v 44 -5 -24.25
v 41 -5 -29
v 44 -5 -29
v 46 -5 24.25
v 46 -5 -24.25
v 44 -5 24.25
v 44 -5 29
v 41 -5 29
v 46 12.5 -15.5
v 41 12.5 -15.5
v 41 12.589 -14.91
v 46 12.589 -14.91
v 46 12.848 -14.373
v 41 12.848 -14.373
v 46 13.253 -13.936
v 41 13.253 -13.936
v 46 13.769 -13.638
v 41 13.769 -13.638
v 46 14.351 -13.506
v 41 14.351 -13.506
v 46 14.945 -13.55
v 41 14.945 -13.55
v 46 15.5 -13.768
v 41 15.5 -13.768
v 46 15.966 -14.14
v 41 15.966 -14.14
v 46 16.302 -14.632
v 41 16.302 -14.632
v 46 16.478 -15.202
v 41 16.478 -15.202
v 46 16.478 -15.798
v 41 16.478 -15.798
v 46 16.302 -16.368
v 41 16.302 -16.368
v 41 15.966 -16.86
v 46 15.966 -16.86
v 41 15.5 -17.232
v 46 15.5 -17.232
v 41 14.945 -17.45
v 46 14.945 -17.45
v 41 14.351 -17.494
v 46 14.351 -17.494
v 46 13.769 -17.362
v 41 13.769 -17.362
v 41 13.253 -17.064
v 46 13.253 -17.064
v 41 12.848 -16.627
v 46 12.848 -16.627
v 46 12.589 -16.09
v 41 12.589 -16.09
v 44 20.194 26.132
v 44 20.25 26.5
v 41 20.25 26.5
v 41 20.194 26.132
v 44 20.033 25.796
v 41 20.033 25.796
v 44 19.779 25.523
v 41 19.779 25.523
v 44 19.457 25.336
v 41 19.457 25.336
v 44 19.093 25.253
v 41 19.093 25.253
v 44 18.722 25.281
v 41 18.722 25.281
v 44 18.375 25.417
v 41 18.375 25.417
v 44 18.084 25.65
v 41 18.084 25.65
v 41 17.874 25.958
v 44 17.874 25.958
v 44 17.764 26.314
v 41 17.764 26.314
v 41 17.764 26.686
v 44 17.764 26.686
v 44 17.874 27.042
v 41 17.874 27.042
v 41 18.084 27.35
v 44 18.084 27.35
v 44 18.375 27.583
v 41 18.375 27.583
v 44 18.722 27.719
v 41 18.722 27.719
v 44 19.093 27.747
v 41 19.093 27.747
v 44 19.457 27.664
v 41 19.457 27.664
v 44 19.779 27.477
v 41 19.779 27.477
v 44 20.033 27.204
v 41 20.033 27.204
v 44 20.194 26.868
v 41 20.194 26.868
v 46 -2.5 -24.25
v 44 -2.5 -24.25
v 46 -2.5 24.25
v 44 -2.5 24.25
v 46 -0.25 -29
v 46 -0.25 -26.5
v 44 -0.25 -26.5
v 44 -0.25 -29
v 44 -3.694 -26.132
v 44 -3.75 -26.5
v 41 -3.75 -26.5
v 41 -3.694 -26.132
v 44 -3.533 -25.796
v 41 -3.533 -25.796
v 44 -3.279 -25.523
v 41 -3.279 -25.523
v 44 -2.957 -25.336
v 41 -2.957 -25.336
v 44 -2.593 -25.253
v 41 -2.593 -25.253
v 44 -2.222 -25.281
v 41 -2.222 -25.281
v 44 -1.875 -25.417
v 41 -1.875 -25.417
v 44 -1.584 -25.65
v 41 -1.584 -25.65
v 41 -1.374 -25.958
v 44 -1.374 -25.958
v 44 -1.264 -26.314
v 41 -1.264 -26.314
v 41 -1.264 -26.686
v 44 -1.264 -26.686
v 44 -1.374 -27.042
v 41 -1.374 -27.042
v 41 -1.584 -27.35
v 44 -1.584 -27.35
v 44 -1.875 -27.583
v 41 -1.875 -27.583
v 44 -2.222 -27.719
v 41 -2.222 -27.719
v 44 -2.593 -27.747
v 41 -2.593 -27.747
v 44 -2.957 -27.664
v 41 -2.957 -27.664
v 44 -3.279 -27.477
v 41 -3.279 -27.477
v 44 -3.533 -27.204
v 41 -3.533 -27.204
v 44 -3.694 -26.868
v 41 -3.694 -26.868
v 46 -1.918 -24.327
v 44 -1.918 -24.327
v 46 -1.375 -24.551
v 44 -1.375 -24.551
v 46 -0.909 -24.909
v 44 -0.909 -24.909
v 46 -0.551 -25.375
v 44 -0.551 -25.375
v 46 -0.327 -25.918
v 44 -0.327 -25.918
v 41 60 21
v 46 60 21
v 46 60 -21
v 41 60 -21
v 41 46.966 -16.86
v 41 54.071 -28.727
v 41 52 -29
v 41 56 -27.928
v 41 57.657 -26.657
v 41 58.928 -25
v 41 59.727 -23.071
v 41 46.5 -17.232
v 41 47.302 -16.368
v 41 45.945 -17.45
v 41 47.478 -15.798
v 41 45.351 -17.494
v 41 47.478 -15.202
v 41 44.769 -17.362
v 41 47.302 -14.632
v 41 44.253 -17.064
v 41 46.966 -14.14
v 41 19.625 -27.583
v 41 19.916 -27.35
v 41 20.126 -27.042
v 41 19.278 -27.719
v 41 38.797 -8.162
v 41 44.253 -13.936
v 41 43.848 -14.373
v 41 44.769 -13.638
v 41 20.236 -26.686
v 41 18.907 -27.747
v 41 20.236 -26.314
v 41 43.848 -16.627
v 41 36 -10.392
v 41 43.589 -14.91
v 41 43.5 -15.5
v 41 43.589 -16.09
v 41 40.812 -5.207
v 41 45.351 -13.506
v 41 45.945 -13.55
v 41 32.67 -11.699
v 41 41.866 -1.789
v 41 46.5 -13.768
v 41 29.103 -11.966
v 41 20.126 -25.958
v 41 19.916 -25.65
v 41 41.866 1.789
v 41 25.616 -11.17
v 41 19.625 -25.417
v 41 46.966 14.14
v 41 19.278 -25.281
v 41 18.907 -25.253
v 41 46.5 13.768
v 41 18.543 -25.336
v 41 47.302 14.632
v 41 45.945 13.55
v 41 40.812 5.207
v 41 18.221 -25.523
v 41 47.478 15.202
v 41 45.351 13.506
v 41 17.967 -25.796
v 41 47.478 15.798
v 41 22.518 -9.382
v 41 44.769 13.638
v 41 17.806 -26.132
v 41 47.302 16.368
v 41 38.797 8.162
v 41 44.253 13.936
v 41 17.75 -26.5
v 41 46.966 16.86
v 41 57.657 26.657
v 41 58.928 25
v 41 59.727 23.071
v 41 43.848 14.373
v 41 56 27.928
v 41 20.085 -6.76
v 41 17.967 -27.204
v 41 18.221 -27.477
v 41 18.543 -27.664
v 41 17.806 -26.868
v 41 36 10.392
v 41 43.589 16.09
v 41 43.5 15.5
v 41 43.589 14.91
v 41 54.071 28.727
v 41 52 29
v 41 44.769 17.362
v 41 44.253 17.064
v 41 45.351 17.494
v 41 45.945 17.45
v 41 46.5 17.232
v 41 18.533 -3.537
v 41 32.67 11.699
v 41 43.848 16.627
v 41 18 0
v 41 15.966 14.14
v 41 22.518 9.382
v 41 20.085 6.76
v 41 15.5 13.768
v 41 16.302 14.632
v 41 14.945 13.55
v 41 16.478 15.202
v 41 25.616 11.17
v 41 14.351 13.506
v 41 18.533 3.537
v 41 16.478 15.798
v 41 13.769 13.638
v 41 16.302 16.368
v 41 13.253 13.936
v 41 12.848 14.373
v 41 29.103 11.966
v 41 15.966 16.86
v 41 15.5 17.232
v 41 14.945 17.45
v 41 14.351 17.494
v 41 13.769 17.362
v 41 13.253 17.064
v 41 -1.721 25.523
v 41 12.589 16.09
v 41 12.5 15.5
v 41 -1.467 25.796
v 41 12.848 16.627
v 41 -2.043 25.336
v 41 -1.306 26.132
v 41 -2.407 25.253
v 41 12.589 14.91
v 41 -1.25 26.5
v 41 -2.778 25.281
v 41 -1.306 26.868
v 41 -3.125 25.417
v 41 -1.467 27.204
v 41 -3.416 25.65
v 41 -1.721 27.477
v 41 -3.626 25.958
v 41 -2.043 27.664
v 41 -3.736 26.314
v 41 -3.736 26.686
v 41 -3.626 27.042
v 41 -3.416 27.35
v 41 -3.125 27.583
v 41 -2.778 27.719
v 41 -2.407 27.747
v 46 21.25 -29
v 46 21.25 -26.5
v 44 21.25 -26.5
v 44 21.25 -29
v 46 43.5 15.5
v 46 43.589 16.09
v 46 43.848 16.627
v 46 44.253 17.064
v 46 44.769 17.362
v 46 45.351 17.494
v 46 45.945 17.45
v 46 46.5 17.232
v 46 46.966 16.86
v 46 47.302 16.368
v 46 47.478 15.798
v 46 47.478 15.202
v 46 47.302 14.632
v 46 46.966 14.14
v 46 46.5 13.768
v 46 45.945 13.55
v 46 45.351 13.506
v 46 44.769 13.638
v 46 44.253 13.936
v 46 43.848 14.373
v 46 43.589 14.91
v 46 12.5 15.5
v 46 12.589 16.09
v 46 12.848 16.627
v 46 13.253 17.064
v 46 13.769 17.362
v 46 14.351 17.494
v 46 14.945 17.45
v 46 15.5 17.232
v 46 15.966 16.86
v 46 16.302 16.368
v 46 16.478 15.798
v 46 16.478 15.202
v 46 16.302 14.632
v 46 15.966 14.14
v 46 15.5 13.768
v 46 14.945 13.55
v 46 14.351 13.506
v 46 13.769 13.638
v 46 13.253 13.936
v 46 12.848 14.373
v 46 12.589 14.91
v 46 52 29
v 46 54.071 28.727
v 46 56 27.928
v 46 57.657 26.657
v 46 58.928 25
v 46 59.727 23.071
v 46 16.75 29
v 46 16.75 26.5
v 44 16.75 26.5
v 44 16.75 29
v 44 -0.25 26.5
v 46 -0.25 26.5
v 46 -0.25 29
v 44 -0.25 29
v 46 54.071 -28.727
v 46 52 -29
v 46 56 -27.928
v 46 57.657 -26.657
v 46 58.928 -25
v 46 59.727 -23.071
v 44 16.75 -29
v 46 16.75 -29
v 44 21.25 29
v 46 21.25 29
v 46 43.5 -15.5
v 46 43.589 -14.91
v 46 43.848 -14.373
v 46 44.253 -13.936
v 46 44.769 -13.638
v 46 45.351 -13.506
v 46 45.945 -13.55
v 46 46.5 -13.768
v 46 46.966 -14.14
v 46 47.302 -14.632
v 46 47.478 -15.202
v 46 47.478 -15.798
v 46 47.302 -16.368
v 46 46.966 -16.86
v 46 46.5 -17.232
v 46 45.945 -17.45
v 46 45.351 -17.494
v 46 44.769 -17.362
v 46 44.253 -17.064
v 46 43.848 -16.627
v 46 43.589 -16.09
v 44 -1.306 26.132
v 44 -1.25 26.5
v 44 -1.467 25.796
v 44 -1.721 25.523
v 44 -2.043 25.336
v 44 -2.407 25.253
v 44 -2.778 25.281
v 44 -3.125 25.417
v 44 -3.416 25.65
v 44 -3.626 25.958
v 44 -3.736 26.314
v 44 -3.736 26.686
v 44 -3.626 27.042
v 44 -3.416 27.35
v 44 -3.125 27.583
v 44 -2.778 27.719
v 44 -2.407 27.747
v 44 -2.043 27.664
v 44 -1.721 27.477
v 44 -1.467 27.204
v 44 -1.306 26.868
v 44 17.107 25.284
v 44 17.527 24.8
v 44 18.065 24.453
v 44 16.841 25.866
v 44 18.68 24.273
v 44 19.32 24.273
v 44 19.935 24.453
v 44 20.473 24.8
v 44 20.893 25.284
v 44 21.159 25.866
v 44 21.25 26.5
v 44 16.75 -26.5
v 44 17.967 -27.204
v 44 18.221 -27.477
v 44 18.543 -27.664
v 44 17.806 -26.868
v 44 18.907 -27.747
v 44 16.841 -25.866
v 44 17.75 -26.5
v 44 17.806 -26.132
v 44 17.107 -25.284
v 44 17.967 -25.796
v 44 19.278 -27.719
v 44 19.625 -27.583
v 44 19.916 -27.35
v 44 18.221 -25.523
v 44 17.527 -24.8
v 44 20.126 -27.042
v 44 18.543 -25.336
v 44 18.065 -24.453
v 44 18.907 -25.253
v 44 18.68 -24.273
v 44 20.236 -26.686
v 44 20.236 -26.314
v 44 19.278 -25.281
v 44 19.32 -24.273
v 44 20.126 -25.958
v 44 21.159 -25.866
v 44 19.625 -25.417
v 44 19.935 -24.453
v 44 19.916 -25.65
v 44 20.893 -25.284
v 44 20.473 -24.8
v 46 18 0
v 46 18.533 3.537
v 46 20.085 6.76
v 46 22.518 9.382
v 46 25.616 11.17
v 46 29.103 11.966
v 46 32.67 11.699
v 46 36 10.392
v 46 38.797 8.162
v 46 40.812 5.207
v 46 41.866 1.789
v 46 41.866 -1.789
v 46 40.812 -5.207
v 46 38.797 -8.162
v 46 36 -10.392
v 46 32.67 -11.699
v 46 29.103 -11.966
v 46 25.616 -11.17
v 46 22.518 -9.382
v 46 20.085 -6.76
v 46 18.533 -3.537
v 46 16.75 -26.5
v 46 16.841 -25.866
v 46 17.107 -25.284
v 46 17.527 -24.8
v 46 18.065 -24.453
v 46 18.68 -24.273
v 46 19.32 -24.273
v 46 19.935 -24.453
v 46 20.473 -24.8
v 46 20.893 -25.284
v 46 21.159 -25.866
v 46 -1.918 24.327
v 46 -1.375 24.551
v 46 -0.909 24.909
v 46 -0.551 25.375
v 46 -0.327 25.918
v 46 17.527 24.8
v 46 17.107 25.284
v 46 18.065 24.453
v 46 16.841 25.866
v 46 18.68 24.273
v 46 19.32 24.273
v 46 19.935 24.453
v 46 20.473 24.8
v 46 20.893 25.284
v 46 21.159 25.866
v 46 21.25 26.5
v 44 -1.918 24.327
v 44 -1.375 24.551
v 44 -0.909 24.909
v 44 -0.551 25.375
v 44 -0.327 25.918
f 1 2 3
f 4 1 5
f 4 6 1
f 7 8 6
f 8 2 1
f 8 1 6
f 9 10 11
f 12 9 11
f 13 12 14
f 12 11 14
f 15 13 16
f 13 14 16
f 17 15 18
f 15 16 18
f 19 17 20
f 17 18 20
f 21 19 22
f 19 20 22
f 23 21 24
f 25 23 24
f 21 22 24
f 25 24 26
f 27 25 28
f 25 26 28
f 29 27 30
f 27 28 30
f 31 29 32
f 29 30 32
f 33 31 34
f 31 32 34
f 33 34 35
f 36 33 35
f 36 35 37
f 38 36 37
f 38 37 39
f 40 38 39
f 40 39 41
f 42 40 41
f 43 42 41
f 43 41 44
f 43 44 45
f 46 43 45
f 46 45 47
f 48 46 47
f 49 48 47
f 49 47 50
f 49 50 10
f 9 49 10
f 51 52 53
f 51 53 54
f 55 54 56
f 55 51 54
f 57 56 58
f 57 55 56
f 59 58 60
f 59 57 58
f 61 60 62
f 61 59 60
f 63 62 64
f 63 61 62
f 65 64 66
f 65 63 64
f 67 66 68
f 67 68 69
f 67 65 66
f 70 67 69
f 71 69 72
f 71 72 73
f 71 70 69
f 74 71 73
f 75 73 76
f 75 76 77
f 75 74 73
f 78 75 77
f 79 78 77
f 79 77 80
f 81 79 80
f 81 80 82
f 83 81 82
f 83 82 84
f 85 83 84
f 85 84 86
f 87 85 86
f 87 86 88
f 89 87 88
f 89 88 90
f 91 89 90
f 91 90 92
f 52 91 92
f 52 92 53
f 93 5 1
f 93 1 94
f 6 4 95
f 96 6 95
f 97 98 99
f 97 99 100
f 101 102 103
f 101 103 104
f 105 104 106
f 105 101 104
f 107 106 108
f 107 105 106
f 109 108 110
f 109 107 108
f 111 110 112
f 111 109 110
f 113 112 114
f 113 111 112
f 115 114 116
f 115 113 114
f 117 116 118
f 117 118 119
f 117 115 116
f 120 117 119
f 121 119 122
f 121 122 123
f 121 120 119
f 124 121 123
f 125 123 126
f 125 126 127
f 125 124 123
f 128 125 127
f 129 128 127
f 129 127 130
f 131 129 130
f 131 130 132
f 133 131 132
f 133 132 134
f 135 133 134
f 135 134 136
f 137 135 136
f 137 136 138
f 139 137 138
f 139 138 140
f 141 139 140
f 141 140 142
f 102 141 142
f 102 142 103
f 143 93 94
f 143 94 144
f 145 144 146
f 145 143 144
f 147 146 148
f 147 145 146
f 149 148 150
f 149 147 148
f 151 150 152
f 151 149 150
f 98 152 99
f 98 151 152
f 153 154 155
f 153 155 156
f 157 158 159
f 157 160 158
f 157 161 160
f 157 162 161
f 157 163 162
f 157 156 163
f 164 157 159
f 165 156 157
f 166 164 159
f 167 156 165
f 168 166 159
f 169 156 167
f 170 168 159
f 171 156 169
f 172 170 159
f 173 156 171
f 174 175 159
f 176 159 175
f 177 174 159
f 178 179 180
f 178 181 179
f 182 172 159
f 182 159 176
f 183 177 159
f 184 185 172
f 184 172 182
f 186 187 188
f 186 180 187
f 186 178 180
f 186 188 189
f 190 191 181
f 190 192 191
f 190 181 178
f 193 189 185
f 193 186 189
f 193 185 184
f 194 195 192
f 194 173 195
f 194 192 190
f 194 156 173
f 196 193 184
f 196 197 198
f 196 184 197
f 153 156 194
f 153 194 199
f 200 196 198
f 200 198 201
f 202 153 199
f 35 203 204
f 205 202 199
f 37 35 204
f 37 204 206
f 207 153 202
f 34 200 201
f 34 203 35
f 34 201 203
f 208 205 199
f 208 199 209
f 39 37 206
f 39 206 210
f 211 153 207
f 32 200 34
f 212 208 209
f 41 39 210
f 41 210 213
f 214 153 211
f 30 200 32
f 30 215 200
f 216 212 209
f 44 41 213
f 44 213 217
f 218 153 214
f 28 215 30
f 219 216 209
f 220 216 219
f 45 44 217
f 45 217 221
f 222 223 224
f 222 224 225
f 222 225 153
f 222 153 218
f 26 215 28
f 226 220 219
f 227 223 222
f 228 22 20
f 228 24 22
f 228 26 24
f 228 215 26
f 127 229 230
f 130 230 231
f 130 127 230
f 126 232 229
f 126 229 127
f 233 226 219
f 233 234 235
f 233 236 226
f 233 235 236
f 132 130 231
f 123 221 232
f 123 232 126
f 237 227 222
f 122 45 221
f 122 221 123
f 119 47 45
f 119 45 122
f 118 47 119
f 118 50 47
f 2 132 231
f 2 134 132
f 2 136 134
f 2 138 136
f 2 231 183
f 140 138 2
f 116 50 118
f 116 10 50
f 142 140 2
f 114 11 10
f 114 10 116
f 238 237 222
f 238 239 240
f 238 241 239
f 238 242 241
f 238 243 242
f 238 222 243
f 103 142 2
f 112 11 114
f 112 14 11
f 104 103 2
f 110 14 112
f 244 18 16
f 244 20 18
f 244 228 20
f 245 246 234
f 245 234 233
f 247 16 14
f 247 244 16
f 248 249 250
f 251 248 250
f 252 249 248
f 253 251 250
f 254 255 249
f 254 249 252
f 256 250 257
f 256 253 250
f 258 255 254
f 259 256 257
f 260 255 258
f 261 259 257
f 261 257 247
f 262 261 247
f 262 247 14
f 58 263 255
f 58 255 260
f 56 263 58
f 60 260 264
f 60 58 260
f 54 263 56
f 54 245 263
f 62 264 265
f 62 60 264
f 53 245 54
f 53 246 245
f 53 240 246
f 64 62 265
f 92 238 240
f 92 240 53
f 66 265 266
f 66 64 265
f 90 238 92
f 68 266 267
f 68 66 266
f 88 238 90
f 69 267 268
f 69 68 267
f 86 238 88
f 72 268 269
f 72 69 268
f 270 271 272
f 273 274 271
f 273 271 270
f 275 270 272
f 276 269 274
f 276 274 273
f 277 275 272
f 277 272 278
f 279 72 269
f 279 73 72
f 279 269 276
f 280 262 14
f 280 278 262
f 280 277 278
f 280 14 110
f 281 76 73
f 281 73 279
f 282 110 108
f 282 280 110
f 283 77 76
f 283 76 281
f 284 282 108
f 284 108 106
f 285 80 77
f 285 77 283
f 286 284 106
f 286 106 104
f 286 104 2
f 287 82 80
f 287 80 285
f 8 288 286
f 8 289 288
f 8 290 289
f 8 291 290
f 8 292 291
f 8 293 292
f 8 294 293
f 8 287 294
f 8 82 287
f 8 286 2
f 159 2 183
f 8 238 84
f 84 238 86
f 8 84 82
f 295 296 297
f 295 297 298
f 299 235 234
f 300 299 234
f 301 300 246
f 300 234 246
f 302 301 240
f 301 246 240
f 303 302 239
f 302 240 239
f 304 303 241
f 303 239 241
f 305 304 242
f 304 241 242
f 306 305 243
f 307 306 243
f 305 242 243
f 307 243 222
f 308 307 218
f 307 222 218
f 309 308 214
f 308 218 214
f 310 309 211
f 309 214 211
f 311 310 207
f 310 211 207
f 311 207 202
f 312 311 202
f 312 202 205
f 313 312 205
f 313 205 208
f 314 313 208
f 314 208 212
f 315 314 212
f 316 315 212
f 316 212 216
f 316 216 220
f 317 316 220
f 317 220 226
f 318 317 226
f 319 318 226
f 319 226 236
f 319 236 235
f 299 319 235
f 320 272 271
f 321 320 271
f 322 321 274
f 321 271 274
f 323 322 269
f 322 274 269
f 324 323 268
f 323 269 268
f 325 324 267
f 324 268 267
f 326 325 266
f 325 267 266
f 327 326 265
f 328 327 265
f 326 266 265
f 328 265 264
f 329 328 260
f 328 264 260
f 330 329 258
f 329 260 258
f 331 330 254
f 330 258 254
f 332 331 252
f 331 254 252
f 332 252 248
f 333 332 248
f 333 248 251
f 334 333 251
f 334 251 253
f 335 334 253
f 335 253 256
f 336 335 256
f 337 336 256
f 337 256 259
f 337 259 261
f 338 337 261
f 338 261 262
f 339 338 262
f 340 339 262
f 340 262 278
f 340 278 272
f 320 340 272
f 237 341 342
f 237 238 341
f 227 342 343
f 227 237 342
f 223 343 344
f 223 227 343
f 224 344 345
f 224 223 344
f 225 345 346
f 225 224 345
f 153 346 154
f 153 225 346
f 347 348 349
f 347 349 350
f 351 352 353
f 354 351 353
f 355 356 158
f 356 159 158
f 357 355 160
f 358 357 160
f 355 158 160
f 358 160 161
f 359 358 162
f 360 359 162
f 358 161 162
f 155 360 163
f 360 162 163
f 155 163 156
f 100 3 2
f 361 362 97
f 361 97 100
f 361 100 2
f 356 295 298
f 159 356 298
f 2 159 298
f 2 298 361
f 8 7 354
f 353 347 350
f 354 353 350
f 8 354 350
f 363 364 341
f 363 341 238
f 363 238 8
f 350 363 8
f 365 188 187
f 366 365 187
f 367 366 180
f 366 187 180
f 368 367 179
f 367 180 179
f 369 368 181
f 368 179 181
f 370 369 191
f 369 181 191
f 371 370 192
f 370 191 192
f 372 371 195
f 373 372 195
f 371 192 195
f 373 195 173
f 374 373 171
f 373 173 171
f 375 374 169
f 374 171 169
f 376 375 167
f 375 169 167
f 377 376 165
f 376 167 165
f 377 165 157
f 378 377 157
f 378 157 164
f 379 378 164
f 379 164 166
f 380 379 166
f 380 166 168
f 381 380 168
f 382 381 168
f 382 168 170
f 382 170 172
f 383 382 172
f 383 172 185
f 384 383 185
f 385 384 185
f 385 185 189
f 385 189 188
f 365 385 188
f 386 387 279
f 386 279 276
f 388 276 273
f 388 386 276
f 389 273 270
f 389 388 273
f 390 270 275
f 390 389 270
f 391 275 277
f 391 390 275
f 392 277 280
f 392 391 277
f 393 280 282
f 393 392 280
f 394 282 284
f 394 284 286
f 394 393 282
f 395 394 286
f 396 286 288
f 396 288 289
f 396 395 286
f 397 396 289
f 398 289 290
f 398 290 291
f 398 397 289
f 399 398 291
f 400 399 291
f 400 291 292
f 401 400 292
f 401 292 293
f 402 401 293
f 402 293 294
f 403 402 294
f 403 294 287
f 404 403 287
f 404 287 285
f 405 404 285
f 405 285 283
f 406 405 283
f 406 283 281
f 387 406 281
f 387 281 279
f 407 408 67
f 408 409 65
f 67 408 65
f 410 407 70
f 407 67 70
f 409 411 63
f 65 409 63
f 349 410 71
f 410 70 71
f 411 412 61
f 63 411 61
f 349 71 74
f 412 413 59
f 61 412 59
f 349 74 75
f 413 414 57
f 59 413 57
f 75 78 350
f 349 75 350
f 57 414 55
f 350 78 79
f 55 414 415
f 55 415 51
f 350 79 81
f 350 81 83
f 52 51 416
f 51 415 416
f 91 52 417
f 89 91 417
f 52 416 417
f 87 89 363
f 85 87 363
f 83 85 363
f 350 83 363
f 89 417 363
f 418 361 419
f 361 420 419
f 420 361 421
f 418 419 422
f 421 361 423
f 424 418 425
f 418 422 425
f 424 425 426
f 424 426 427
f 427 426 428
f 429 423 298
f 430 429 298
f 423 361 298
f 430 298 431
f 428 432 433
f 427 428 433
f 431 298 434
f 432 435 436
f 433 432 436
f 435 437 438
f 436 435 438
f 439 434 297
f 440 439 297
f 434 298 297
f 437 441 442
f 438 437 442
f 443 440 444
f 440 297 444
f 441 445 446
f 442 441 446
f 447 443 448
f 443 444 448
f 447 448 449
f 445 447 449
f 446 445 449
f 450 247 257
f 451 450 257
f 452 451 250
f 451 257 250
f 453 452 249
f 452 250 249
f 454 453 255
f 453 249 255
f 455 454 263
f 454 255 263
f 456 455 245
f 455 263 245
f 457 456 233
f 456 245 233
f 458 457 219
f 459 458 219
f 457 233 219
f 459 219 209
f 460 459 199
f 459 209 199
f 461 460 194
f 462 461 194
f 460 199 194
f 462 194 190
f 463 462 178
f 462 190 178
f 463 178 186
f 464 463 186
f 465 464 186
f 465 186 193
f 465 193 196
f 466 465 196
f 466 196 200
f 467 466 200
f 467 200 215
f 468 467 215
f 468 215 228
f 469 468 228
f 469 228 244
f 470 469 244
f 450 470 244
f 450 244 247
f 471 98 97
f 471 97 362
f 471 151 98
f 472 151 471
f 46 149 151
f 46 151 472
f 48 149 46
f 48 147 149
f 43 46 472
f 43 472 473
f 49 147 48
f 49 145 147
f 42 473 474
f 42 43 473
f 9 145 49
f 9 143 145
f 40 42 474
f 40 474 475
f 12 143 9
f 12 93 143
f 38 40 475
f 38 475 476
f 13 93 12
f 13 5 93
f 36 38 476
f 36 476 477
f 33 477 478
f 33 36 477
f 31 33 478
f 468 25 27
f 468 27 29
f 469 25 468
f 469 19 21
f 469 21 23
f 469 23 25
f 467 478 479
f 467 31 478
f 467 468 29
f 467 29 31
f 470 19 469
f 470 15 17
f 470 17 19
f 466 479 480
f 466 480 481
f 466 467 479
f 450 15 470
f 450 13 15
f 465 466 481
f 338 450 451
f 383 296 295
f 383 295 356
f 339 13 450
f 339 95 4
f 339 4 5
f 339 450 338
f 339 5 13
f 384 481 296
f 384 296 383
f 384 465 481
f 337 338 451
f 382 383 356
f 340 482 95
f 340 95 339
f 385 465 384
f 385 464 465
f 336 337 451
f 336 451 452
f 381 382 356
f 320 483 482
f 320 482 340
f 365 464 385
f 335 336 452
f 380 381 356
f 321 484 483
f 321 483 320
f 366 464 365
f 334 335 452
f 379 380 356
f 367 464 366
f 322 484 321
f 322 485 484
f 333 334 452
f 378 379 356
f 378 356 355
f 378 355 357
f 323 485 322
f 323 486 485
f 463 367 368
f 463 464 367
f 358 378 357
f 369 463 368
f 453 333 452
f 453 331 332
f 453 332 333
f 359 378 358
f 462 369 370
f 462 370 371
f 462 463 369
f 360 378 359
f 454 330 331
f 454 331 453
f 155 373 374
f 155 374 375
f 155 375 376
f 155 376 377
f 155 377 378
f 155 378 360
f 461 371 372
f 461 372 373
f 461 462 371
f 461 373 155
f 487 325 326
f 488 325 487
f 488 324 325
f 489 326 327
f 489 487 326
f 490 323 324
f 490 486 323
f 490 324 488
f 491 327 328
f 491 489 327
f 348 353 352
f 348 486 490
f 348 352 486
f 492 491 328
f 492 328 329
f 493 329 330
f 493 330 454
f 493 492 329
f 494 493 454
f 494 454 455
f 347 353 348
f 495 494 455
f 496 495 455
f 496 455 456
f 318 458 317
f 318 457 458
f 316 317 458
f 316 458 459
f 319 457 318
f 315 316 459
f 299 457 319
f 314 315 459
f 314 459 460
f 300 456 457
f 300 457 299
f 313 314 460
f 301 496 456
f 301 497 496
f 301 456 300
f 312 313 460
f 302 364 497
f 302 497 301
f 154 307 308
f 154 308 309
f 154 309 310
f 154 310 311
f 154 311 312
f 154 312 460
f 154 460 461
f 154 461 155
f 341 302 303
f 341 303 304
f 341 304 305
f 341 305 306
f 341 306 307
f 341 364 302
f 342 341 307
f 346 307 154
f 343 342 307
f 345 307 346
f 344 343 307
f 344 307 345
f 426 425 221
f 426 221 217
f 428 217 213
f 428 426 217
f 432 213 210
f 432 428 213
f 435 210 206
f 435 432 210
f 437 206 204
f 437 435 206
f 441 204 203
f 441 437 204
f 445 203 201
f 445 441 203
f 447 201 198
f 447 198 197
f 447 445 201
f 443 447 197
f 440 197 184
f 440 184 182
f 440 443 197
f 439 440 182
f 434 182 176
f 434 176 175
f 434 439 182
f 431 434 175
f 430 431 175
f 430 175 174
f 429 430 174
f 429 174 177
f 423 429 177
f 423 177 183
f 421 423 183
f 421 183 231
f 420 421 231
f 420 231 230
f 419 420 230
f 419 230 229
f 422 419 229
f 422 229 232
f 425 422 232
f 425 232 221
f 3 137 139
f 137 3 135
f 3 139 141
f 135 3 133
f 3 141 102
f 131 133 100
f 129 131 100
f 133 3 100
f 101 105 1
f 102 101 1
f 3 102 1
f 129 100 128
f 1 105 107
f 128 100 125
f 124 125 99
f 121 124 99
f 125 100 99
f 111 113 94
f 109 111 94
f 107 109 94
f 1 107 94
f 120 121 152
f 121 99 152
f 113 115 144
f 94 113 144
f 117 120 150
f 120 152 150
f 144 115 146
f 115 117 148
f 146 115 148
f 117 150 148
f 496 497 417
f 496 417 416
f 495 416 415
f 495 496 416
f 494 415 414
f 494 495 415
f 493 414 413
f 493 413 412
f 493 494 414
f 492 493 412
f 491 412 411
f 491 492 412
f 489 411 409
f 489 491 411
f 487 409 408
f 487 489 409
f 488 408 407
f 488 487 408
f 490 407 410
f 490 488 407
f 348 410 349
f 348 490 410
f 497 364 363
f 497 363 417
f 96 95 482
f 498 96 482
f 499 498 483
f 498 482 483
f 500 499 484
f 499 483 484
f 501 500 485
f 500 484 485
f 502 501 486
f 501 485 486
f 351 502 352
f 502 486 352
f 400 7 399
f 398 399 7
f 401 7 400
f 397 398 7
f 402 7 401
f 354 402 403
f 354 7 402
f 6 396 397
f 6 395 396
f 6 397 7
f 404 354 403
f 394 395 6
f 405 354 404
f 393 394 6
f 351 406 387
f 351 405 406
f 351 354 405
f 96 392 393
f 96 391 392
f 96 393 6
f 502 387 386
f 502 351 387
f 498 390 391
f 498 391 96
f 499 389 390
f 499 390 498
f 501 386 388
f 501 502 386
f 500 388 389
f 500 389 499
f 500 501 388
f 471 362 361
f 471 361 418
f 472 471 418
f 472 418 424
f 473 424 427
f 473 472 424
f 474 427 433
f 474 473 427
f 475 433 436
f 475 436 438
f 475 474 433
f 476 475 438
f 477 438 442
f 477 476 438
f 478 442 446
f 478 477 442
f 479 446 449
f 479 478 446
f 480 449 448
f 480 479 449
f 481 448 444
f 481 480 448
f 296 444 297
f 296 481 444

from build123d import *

# Parameters (mm, degrees)
RESSALTO_EXTRUS_O1_DEPTH  = 29
CORTE_EXTRUS_O1_REACH     = 115.6
ESBO_O2_R                 = 6.5
ESBO_O3_R                 = 18
CORTE_EXTRUS_O2_DEPTH     = 2.5
CORTE_EXTRUS_O3_START     = -5
ESBO_O5_R                 = 2
ESBO_O5_R_2               = 1.5
CORTE_EXTRUS_O3_DEPTH     = 5
ESBO_O7_R                 = 12
ESBO_O7_R_2               = 2
CORTE_EXTRUS_O4_DEPTH     = 110.590145542
ESBO_O11_W                = 18
ESBO_O11_H                = 10
RESSALTO_EXTRUS_O3_DEPTH  = 8
ESBO_O12_W                = 14.4
ESBO_O12_H                = 6.8
CORTE_EXTRUS_O6_DEPTH     = 3
ESBO_O13_W                = 13.4
ESBO_O13_H                = 5.8
CORTE_EXTRUS_O7_DEPTH     = 5
CORTE_EXTRUS_O8_REACH     = 84.898
RESSALTO_EXTRUS_O4_DEPTH  = 5
ESBO_O17_W                = 2.6
ESBO_O17_H                = 10
RESSALTO_EXTRUS_O5_DEPTH  = 8
CHANFRO1_SIZE             = 5
FILETE1_R                 = 8
ESBO_O18_W                = 20
ESBO_O18_H                = 8
RESSALTO_EXTRUS_O6_DEPTH  = 13
ESBO_O19_R                = 2.25
CORTE_EXTRUS_O9_DEPTH     = 80.252760204
CHANFRO2_SIZE             = 3
CHANFRO2_SIZE_2           = 13
CORTE_EXTRUS_O10_START    = -6
CORTE_EXTRUS_O10_DEPTH    = 74.252760204
ESBO_O21_W                = 26
ESBO_O21_H                = 16
RESSALTO_EXTRUS_O7_DEPTH  = 30
CORTE_EXTRUS_O11_DEPTH    = 26
ESBO_O24_R                = 1
ESBO_O24_W                = 17.2
ESBO_O24_H                = 3
RESSALTO_EXTRUS_O8_DEPTH  = 3
ESBO_O25_W                = 11.2
ESBO_O25_H                = 4
CORTE_EXTRUS_O12_DEPTH    = 2
ESBO_O26_R                = 3.5
CORTE_EXTRUS_O13_DEPTH    = 96.289033997
ESBO_O27_W                = 24
ESBO_O27_H                = 8
RESSALTO_EXTRUS_O9_DEPTH  = 6
ESBO_O28_W                = 1.5
ESBO_O28_H                = 8
RESSALTO_EXTRUS_O10_DEPTH = 2
ESBO_O31_R                = 1
CORTE_EXTRUS_O14_DEPTH    = 85.172442046
ESBO_O32_R                = 1
CORTE_EXTRUS_O15_DEPTH    = 12
ESBO_O33_R                = 1.25
CORTE_EXTRUS_O16_DEPTH    = 5
CORTE_EXTRUS_O17_DEPTH    = 2
ESBO_O36_R                = 71.402948567
CORTE_EXTRUS_O18_DEPTH    = 114.723348526


with BuildPart() as part:
    # Esboço1 → Ressalto-extrusão1 (new, symmetric)
    with BuildSketch(Plane.XY):
        Polygon((0, 0), (-41, 0), (-41, 60), (-46, 60), (-46, -5), (46, -5), (46, 60), (41, 60), (41, 0), align=None)
    extrude(amount=RESSALTO_EXTRUS_O1_DEPTH, both=True)

    # Esboço2 → Corte-extrusão1 (cut, up to next)
    with BuildSketch(Plane.ZY.offset(46), mode=Mode.PRIVATE) as corte_extrus_o1_sk1:
        with Locations(Location((0, 30, 0), (0, 0, 270))):
            Circle(ESBO_O2_R)
    corte_extrus_o1_tool1 = extrude(corte_extrus_o1_sk1.sketch, amount=-CORTE_EXTRUS_O1_REACH, mode=Mode.PRIVATE) & part.part
    add(corte_extrus_o1_tool1.solids().sort_by_distance((-46, 30, 0))[0], mode=Mode.SUBTRACT)

    # Esboço3 → Corte-extrusão2 (cut)
    with BuildSketch(Plane.ZY.offset(46)):
        with Locations(Location((0, 30, 0), (0, 0, 270))):
            Circle(ESBO_O3_R)
    extrude(amount=-CORTE_EXTRUS_O2_DEPTH, mode=Mode.SUBTRACT)

    # Esboço5 → Corte-extrusão3 (cut)
    with BuildSketch(Plane.ZY.offset(46).offset(CORTE_EXTRUS_O3_START)):
        with Locations(Location((-15.5, 45.5, 0), (0, 0, 270))):
            Circle(ESBO_O5_R)
        with Locations(Location((0, 42, 0), (0, 0, 270))):
            Circle(ESBO_O5_R_2)
        with Locations(Location((0, 18, 0), (0, 0, 270))):
            Circle(ESBO_O5_R_2)
        with Locations(Location((0, 54, 0), (0, 0, 270))):
            Circle(ESBO_O5_R)
        with Locations(Location((15.5, 45.5, 0), (0, 0, 270))):
            Circle(ESBO_O5_R)
        with Locations(Location((15.5, 14.5, 0), (0, 0, 270))):
            Circle(ESBO_O5_R)
        with Locations(Location((-15.5, 14.5, 0), (0, 0, 270))):
            Circle(ESBO_O5_R)
        with Locations(Location((20.784609691, 18, 0), (0, 0, 270))):
            Circle(ESBO_O5_R)
        with Locations(Location((-20.784609691, 18, 0), (0, 0, 270))):
            Circle(ESBO_O5_R)
        with BuildLine():
            Line((-8, 31.5), (8, 31.5))
            ThreePointArc((8, 31.5), (9.5, 30), (8, 28.5))
            Line((8, 28.5), (-8, 28.5))
            ThreePointArc((-8, 28.5), (-9.5, 30), (-8, 31.5))
        make_face()
    extrude(amount=CORTE_EXTRUS_O3_DEPTH, mode=Mode.SUBTRACT)

    # Esboço7 → Corte-extrusão4 (cut, through all)
    with BuildSketch(Plane.ZY.offset(-41)):
        with Locations(Location((0, 30, 0), (0, 0, 270))):
            Circle(ESBO_O7_R)
        with Locations(Location((-15.5, 45.5, 0), (0, 0, 270))):
            Circle(ESBO_O7_R_2)
        with Locations(Location((15.5, 45.5, 0), (0, 0, 270))):
            Circle(ESBO_O7_R_2)
        with Locations(Location((15.5, 14.5, 0), (0, 0, 270))):
            Circle(ESBO_O7_R_2)
        with Locations(Location((-15.5, 14.5, 0), (0, 0, 270))):
            Circle(ESBO_O7_R_2)
    extrude(amount=-CORTE_EXTRUS_O4_DEPTH, mode=Mode.SUBTRACT)

    # Esboço11 → Ressalto-extrusão3 (add)
    with BuildSketch(Plane(origin=(0, 0, 0), x_dir=(1, 0, 0), z_dir=(0, 1, 0))):
        with Locations((-29.4, 0)):
            Rectangle(ESBO_O11_W, ESBO_O11_H)
    extrude(amount=RESSALTO_EXTRUS_O3_DEPTH)

    # Esboço12 → Corte-extrusão6 (cut)
    with BuildSketch(Plane(origin=(0, 8, 0), x_dir=(1, 0, 0), z_dir=(0, 1, 0))):
        with Locations((-29.4, 0)):
            Rectangle(ESBO_O12_W, ESBO_O12_H)
    extrude(amount=-CORTE_EXTRUS_O6_DEPTH, mode=Mode.SUBTRACT)

    # Esboço13 → Corte-extrusão7 (cut)
    with BuildSketch(Plane(origin=(0, 5, 0), x_dir=(1, 0, 0), z_dir=(0, 1, 0))):
        with Locations((-29.4, 0)):
            Rectangle(ESBO_O13_W, ESBO_O13_H)
    extrude(amount=-CORTE_EXTRUS_O7_DEPTH, mode=Mode.SUBTRACT)

    # Esboço14 → Corte-extrusão8 (cut, up to next)
    with BuildSketch(Plane.XY.offset(5), mode=Mode.PRIVATE) as corte_extrus_o8_sk1:
        with BuildLine():
            Line((-33.4, 0), (-25.4, 0))
            ThreePointArc((-25.4, 0), (-29.4, 4), (-33.4, 0))
        make_face()
    corte_extrus_o8_tool1 = extrude(corte_extrus_o8_sk1.sketch, amount=-CORTE_EXTRUS_O8_REACH, mode=Mode.PRIVATE) & part.part
    add(corte_extrus_o8_tool1.solids().sort_by_distance((-29.4, 1.697653, 5))[0], mode=Mode.SUBTRACT)

    # Esboço16 → Ressalto-extrusão4 (add)
    with BuildSketch(Plane.XY.offset(29)):
        Polygon((-41, 32), (-21, 12), (21, 12), (41, 32), (41, 0), (-41, 0), align=None)
    ressalto_extrus_o4 = extrude(amount=-RESSALTO_EXTRUS_O4_DEPTH)

    # Espelhar1: Ressalto-extrusão4 across plane
    add(ressalto_extrus_o4.mirror(Plane.XY))

    # Esboço17 → Ressalto-extrusão5 (add)
    with BuildSketch(Plane(origin=(0, 8, 0), x_dir=(1, 0, 0), z_dir=(0, 1, 0))):
        with Locations((-39.7, 0)):
            Rectangle(ESBO_O17_W, ESBO_O17_H)
    extrude(amount=-RESSALTO_EXTRUS_O5_DEPTH)

    # Chanfro1
    chanfro1_edges = [part.edges().sort_by_distance(p)[0] for p in [
        (41, 0, 0),
        (-41, 0, 14.5),
        (-41, 0, -14.5),
    ]]
    chamfer(chanfro1_edges, length=CHANFRO1_SIZE)

    # Filete1
    filete1_edges = [part.edges().sort_by_distance(p)[0] for p in [
        (-43.5, 60, -29),
        (-43.5, 60, 29),
        (-41, 32, 26.5),
        (-21, 12, 26.5),
        (21, 12, 26.5),
        (41, 32, 26.5),
        (-41, 32, -26.5),
        (41, 32, -26.5),
        (21, 12, -26.5),
        (-21, 12, -26.5),
        (43.5, 60, 29),
        (43.5, 60, -29),
    ]]
    fillet(filete1_edges, radius=FILETE1_R)

    # Esboço18 → Ressalto-extrusão6 (add)
    with BuildSketch(Plane.XY.offset(29)):
        with Locations((22, 7)):
            Rectangle(ESBO_O18_W, ESBO_O18_H)
    extrude(amount=RESSALTO_EXTRUS_O6_DEPTH)

    # Esboço19 → Corte-extrusão9 (cut, through all)
    with BuildSketch(Plane(origin=(0, 11, 0), x_dir=(1, 0, 0), z_dir=(0, 1, 0))):
        with Locations(Location((18, -35.75, 0), (0, 0, 270))):
            Circle(ESBO_O19_R)
        with Locations(Location((26, -35.75, 0), (0, 0, 270))):
            Circle(ESBO_O19_R)
    extrude(amount=-CORTE_EXTRUS_O9_DEPTH, mode=Mode.SUBTRACT)

    # Chanfro2
    # the kernel refuses this chamfer: 13, 3 mm, written as the material it adds along each edge
    with BuildSketch(Plane(origin=(12, 3, 29), x_dir=(0, -0.987043568605235, -0.1604524654688814), z_dir=(1, 0, 0))) as chanfro2_piece_1_section:
        Polygon((CHANFRO2_SIZE * 0.987043568605, -CHANFRO2_SIZE * 0.160452465469), (-CHANFRO2_SIZE_2 * 0.160452465469, -CHANFRO2_SIZE_2 * 0.987043568605), (0, 0), align=None)
    chanfro2_piece_1 = extrude(amount=20, mode=Mode.PRIVATE)
    chanfro2_piece_1 = split(chanfro2_piece_1, bisect_by=Plane(origin=(21.999997786, 2.099377296, 42), z_dir=(0, 0, -1)), keep=Keep.TOP, mode=Mode.PRIVATE)
    chanfro2_piece_1 = chanfro2_piece_1 - Plane(origin=(18, 2.099377296, 35.75), x_dir=(0, 0, 1), z_dir=(0, 1, 0)) * Cylinder(2.25, 92, mode=Mode.PRIVATE)
    chanfro2_piece_1 = chanfro2_piece_1 - Plane(origin=(26, 2.099377296, 35.75), x_dir=(0, 0, 1), z_dir=(0, 1, 0)) * Cylinder(2.25, 92, mode=Mode.PRIVATE)
    add(chanfro2_piece_1)

    # Esboço20 → Corte-extrusão10 (cut, through all)
    with BuildSketch(Plane(origin=(0, 11, 0), x_dir=(1, 0, 0), z_dir=(0, 1, 0)).offset(CORTE_EXTRUS_O10_START)):
        with BuildLine():
            Line((18, -31.5), (26, -31.5))
            ThreePointArc((26, -31.5), (30.25, -35.75), (26, -40))
            Line((26, -40), (18, -40))
            ThreePointArc((18, -40), (13.75, -35.75), (18, -31.5))
        make_face()
    extrude(amount=-CORTE_EXTRUS_O10_DEPTH, mode=Mode.SUBTRACT)

    # Esboço21 → Ressalto-extrusão7 (add)
    with BuildSketch(Plane(origin=(0, 0, 0), x_dir=(1, 0, 0), z_dir=(0, 1, 0))):
        with Locations((-1, 0)):
            Rectangle(ESBO_O21_W, ESBO_O21_H)
    extrude(amount=RESSALTO_EXTRUS_O7_DEPTH)

    # Esboço22 → Corte-extrusão11 (cut)
    with BuildSketch(Plane(origin=(12, 0, 0), x_dir=(0, 0, -1), z_dir=(1, 0, 0))):
        Polygon((6.812733176, 30), (3.406366588, 35.9), (-3.406366588, 35.9), (-6.812733176, 30), (-3.406366588, 24.1), (3.406366588, 24.1), align=None)
    extrude(amount=-CORTE_EXTRUS_O11_DEPTH, mode=Mode.SUBTRACT)

    # Esboço24 → Ressalto-extrusão8 (add)
    # profile 1 of 2: a face of its own
    with BuildSketch(Plane(origin=(0, 0, 0), x_dir=(1, 0, 0), z_dir=(0, 1, 0))):
        with BuildLine():
            Line((17.282291959, 14), (32.482291959, 14))
            ThreePointArc((32.482291959, 14), (34.482291959, 12), (32.482291959, 10))
            Line((32.482291959, 10), (17.282291959, 10))
            ThreePointArc((17.282291959, 10), (15.282291959, 12), (17.282291959, 14))
        make_face()
        with Locations(Location((17.282291959, 12, 0), (0, 0, 180))):
            Circle(ESBO_O24_R, mode=Mode.SUBTRACT)
        with Locations(Location((32.482291959, 12, 0), (0, 0, 180))):
            Circle(ESBO_O24_R, mode=Mode.SUBTRACT)
    # profile 2 of 2: a face of its own
    with BuildSketch(Plane(origin=(0, 0, 0), x_dir=(1, 0, 0), z_dir=(0, 1, 0))):
        with Locations((24.882291959, -8.5)):
            Rectangle(ESBO_O24_W, ESBO_O24_H)
    extrude(amount=RESSALTO_EXTRUS_O8_DEPTH)

    # Esboço25 → Corte-extrusão12 (cut)
    with BuildSketch(Plane(origin=(0, 3, 0), x_dir=(1, 0, 0), z_dir=(0, 1, 0))):
        with Locations((24.882291959, 12)):
            Rectangle(ESBO_O25_W, ESBO_O25_H)
    extrude(amount=-CORTE_EXTRUS_O12_DEPTH, mode=Mode.SUBTRACT)

    # Esboço26 → Corte-extrusão13 (cut, through all)
    with BuildSketch(Plane.XY.offset(29)):
        with Locations((36, 5)):
            Circle(ESBO_O26_R)
    extrude(amount=-CORTE_EXTRUS_O13_DEPTH, mode=Mode.SUBTRACT)

    # Esboço27 → Ressalto-extrusão9 (add)
    with BuildSketch(Plane(origin=(0, 0, 0), x_dir=(1, 0, 0), z_dir=(0, 1, 0))):
        with Locations((-4, 16)):
            Rectangle(ESBO_O27_W, ESBO_O27_H)
    extrude(amount=RESSALTO_EXTRUS_O9_DEPTH)

    # Esboço28 → Ressalto-extrusão10 (add)
    with BuildSketch(Plane(origin=(0, 6, 0), x_dir=(1, 0, 0), z_dir=(0, 1, 0))):
        with Locations((-15.25, 16)):
            Rectangle(ESBO_O28_W, ESBO_O28_H)
        with Locations((7.25, 16)):
            Rectangle(ESBO_O28_W, ESBO_O28_H)
    extrude(amount=RESSALTO_EXTRUS_O10_DEPTH)

    # Esboço31 → Corte-extrusão14 (cut, through all)
    with BuildSketch(Plane.XY.offset(8)):
        with Locations((-10, 22.5)):
            Circle(ESBO_O31_R)
        with Locations((8, 22.5)):
            Circle(ESBO_O31_R)
    extrude(amount=-CORTE_EXTRUS_O14_DEPTH, mode=Mode.SUBTRACT)

    # Esboço32 → Corte-extrusão15 (cut)
    with BuildSketch(Plane.ZY.offset(46)):
        with Locations(Location((-26.5, -2.5, 0), (0, 0, 270))):
            Circle(ESBO_O32_R)
        with Locations(Location((-26.5, 19, 0), (0, 0, 270))):
            Circle(ESBO_O32_R)
        with Locations(Location((26.5, 19, 0), (0, 0, 90))):
            Circle(ESBO_O32_R)
        with Locations(Location((26.5, -2.5, 0), (0, 0, 90))):
            Circle(ESBO_O32_R)
    corte_extrus_o15 = extrude(amount=-CORTE_EXTRUS_O15_DEPTH, mode=Mode.SUBTRACT)

    # Esboço33 → Corte-extrusão16 (cut)
    with BuildSketch(Plane.ZY.offset(46)):
        with Locations(Location((-26.5, -2.5, 0), (0, 0, 270))):
            Circle(ESBO_O33_R)
        with Locations(Location((-26.5, 19, 0), (0, 0, 270))):
            Circle(ESBO_O33_R)
        with Locations(Location((26.5, 19, 0), (0, 0, 90))):
            Circle(ESBO_O33_R)
        with Locations(Location((26.5, -2.5, 0), (0, 0, 90))):
            Circle(ESBO_O33_R)
    corte_extrus_o16 = extrude(amount=-CORTE_EXTRUS_O16_DEPTH, mode=Mode.SUBTRACT)

    # Esboço34 → Corte-extrusão17 (cut)
    with BuildSketch(Plane.ZY.offset(46)):
        with BuildLine():
            Line((-26.5, -0.25), (-29, -0.25))
            Line((-29, -0.25), (-29, -5))
            Line((-29, -5), (-24.25, -5))
            Line((-24.25, -5), (-24.25, -2.5))
            ThreePointArc((-24.25, -2.5), (-24.909009742, -0.909009742), (-26.5, -0.25))
        make_face()
        with BuildLine():
            Line((-26.5, 21.25), (-29, 21.25))
            Line((-29, 21.25), (-29, 16.75))
            Line((-29, 16.75), (-26.5, 16.75))
            ThreePointArc((-26.5, 16.75), (-24.25, 19), (-26.5, 21.25))
        make_face()
        with BuildLine():
            Line((29, 16.75), (29, 21.25))
            Line((29, 21.25), (26.5, 21.25))
            ThreePointArc((26.5, 21.25), (24.25, 19), (26.5, 16.75))
            Line((26.5, 16.75), (29, 16.75))
        make_face()
        with BuildLine():
            Line((29, -5), (24.25, -5))
            Line((24.25, -5), (24.25, -2.5))
            ThreePointArc((24.25, -2.5), (24.909009742, -0.909009742), (26.5, -0.25))
            Line((26.5, -0.25), (29, -0.25))
            Line((29, -0.25), (29, -5))
        make_face()
    corte_extrus_o17 = extrude(amount=-CORTE_EXTRUS_O17_DEPTH, mode=Mode.SUBTRACT)

    # Espelhar2: Corte-extrusão15, Corte-extrusão16, Corte-extrusão17 across plane
    add(corte_extrus_o15.mirror(Plane(origin=(0, 0, 0), x_dir=(0, 0, 1), z_dir=(1, 0, 0))), mode=Mode.SUBTRACT)
    add(corte_extrus_o16.mirror(Plane(origin=(0, 0, 0), x_dir=(0, 0, 1), z_dir=(1, 0, 0))), mode=Mode.SUBTRACT)
    add(corte_extrus_o17.mirror(Plane(origin=(0, 0, 0), x_dir=(0, 0, 1), z_dir=(1, 0, 0))), mode=Mode.SUBTRACT)

    # Esboço36 → Corte-extrusão18 (cut, through all)
    with BuildSketch(Plane.ZY.offset(-41)):
        with Locations((0, 30)):
            Circle(ESBO_O36_R)
    extrude(amount=CORTE_EXTRUS_O18_DEPTH, mode=Mode.SUBTRACT)


solid = part.part
